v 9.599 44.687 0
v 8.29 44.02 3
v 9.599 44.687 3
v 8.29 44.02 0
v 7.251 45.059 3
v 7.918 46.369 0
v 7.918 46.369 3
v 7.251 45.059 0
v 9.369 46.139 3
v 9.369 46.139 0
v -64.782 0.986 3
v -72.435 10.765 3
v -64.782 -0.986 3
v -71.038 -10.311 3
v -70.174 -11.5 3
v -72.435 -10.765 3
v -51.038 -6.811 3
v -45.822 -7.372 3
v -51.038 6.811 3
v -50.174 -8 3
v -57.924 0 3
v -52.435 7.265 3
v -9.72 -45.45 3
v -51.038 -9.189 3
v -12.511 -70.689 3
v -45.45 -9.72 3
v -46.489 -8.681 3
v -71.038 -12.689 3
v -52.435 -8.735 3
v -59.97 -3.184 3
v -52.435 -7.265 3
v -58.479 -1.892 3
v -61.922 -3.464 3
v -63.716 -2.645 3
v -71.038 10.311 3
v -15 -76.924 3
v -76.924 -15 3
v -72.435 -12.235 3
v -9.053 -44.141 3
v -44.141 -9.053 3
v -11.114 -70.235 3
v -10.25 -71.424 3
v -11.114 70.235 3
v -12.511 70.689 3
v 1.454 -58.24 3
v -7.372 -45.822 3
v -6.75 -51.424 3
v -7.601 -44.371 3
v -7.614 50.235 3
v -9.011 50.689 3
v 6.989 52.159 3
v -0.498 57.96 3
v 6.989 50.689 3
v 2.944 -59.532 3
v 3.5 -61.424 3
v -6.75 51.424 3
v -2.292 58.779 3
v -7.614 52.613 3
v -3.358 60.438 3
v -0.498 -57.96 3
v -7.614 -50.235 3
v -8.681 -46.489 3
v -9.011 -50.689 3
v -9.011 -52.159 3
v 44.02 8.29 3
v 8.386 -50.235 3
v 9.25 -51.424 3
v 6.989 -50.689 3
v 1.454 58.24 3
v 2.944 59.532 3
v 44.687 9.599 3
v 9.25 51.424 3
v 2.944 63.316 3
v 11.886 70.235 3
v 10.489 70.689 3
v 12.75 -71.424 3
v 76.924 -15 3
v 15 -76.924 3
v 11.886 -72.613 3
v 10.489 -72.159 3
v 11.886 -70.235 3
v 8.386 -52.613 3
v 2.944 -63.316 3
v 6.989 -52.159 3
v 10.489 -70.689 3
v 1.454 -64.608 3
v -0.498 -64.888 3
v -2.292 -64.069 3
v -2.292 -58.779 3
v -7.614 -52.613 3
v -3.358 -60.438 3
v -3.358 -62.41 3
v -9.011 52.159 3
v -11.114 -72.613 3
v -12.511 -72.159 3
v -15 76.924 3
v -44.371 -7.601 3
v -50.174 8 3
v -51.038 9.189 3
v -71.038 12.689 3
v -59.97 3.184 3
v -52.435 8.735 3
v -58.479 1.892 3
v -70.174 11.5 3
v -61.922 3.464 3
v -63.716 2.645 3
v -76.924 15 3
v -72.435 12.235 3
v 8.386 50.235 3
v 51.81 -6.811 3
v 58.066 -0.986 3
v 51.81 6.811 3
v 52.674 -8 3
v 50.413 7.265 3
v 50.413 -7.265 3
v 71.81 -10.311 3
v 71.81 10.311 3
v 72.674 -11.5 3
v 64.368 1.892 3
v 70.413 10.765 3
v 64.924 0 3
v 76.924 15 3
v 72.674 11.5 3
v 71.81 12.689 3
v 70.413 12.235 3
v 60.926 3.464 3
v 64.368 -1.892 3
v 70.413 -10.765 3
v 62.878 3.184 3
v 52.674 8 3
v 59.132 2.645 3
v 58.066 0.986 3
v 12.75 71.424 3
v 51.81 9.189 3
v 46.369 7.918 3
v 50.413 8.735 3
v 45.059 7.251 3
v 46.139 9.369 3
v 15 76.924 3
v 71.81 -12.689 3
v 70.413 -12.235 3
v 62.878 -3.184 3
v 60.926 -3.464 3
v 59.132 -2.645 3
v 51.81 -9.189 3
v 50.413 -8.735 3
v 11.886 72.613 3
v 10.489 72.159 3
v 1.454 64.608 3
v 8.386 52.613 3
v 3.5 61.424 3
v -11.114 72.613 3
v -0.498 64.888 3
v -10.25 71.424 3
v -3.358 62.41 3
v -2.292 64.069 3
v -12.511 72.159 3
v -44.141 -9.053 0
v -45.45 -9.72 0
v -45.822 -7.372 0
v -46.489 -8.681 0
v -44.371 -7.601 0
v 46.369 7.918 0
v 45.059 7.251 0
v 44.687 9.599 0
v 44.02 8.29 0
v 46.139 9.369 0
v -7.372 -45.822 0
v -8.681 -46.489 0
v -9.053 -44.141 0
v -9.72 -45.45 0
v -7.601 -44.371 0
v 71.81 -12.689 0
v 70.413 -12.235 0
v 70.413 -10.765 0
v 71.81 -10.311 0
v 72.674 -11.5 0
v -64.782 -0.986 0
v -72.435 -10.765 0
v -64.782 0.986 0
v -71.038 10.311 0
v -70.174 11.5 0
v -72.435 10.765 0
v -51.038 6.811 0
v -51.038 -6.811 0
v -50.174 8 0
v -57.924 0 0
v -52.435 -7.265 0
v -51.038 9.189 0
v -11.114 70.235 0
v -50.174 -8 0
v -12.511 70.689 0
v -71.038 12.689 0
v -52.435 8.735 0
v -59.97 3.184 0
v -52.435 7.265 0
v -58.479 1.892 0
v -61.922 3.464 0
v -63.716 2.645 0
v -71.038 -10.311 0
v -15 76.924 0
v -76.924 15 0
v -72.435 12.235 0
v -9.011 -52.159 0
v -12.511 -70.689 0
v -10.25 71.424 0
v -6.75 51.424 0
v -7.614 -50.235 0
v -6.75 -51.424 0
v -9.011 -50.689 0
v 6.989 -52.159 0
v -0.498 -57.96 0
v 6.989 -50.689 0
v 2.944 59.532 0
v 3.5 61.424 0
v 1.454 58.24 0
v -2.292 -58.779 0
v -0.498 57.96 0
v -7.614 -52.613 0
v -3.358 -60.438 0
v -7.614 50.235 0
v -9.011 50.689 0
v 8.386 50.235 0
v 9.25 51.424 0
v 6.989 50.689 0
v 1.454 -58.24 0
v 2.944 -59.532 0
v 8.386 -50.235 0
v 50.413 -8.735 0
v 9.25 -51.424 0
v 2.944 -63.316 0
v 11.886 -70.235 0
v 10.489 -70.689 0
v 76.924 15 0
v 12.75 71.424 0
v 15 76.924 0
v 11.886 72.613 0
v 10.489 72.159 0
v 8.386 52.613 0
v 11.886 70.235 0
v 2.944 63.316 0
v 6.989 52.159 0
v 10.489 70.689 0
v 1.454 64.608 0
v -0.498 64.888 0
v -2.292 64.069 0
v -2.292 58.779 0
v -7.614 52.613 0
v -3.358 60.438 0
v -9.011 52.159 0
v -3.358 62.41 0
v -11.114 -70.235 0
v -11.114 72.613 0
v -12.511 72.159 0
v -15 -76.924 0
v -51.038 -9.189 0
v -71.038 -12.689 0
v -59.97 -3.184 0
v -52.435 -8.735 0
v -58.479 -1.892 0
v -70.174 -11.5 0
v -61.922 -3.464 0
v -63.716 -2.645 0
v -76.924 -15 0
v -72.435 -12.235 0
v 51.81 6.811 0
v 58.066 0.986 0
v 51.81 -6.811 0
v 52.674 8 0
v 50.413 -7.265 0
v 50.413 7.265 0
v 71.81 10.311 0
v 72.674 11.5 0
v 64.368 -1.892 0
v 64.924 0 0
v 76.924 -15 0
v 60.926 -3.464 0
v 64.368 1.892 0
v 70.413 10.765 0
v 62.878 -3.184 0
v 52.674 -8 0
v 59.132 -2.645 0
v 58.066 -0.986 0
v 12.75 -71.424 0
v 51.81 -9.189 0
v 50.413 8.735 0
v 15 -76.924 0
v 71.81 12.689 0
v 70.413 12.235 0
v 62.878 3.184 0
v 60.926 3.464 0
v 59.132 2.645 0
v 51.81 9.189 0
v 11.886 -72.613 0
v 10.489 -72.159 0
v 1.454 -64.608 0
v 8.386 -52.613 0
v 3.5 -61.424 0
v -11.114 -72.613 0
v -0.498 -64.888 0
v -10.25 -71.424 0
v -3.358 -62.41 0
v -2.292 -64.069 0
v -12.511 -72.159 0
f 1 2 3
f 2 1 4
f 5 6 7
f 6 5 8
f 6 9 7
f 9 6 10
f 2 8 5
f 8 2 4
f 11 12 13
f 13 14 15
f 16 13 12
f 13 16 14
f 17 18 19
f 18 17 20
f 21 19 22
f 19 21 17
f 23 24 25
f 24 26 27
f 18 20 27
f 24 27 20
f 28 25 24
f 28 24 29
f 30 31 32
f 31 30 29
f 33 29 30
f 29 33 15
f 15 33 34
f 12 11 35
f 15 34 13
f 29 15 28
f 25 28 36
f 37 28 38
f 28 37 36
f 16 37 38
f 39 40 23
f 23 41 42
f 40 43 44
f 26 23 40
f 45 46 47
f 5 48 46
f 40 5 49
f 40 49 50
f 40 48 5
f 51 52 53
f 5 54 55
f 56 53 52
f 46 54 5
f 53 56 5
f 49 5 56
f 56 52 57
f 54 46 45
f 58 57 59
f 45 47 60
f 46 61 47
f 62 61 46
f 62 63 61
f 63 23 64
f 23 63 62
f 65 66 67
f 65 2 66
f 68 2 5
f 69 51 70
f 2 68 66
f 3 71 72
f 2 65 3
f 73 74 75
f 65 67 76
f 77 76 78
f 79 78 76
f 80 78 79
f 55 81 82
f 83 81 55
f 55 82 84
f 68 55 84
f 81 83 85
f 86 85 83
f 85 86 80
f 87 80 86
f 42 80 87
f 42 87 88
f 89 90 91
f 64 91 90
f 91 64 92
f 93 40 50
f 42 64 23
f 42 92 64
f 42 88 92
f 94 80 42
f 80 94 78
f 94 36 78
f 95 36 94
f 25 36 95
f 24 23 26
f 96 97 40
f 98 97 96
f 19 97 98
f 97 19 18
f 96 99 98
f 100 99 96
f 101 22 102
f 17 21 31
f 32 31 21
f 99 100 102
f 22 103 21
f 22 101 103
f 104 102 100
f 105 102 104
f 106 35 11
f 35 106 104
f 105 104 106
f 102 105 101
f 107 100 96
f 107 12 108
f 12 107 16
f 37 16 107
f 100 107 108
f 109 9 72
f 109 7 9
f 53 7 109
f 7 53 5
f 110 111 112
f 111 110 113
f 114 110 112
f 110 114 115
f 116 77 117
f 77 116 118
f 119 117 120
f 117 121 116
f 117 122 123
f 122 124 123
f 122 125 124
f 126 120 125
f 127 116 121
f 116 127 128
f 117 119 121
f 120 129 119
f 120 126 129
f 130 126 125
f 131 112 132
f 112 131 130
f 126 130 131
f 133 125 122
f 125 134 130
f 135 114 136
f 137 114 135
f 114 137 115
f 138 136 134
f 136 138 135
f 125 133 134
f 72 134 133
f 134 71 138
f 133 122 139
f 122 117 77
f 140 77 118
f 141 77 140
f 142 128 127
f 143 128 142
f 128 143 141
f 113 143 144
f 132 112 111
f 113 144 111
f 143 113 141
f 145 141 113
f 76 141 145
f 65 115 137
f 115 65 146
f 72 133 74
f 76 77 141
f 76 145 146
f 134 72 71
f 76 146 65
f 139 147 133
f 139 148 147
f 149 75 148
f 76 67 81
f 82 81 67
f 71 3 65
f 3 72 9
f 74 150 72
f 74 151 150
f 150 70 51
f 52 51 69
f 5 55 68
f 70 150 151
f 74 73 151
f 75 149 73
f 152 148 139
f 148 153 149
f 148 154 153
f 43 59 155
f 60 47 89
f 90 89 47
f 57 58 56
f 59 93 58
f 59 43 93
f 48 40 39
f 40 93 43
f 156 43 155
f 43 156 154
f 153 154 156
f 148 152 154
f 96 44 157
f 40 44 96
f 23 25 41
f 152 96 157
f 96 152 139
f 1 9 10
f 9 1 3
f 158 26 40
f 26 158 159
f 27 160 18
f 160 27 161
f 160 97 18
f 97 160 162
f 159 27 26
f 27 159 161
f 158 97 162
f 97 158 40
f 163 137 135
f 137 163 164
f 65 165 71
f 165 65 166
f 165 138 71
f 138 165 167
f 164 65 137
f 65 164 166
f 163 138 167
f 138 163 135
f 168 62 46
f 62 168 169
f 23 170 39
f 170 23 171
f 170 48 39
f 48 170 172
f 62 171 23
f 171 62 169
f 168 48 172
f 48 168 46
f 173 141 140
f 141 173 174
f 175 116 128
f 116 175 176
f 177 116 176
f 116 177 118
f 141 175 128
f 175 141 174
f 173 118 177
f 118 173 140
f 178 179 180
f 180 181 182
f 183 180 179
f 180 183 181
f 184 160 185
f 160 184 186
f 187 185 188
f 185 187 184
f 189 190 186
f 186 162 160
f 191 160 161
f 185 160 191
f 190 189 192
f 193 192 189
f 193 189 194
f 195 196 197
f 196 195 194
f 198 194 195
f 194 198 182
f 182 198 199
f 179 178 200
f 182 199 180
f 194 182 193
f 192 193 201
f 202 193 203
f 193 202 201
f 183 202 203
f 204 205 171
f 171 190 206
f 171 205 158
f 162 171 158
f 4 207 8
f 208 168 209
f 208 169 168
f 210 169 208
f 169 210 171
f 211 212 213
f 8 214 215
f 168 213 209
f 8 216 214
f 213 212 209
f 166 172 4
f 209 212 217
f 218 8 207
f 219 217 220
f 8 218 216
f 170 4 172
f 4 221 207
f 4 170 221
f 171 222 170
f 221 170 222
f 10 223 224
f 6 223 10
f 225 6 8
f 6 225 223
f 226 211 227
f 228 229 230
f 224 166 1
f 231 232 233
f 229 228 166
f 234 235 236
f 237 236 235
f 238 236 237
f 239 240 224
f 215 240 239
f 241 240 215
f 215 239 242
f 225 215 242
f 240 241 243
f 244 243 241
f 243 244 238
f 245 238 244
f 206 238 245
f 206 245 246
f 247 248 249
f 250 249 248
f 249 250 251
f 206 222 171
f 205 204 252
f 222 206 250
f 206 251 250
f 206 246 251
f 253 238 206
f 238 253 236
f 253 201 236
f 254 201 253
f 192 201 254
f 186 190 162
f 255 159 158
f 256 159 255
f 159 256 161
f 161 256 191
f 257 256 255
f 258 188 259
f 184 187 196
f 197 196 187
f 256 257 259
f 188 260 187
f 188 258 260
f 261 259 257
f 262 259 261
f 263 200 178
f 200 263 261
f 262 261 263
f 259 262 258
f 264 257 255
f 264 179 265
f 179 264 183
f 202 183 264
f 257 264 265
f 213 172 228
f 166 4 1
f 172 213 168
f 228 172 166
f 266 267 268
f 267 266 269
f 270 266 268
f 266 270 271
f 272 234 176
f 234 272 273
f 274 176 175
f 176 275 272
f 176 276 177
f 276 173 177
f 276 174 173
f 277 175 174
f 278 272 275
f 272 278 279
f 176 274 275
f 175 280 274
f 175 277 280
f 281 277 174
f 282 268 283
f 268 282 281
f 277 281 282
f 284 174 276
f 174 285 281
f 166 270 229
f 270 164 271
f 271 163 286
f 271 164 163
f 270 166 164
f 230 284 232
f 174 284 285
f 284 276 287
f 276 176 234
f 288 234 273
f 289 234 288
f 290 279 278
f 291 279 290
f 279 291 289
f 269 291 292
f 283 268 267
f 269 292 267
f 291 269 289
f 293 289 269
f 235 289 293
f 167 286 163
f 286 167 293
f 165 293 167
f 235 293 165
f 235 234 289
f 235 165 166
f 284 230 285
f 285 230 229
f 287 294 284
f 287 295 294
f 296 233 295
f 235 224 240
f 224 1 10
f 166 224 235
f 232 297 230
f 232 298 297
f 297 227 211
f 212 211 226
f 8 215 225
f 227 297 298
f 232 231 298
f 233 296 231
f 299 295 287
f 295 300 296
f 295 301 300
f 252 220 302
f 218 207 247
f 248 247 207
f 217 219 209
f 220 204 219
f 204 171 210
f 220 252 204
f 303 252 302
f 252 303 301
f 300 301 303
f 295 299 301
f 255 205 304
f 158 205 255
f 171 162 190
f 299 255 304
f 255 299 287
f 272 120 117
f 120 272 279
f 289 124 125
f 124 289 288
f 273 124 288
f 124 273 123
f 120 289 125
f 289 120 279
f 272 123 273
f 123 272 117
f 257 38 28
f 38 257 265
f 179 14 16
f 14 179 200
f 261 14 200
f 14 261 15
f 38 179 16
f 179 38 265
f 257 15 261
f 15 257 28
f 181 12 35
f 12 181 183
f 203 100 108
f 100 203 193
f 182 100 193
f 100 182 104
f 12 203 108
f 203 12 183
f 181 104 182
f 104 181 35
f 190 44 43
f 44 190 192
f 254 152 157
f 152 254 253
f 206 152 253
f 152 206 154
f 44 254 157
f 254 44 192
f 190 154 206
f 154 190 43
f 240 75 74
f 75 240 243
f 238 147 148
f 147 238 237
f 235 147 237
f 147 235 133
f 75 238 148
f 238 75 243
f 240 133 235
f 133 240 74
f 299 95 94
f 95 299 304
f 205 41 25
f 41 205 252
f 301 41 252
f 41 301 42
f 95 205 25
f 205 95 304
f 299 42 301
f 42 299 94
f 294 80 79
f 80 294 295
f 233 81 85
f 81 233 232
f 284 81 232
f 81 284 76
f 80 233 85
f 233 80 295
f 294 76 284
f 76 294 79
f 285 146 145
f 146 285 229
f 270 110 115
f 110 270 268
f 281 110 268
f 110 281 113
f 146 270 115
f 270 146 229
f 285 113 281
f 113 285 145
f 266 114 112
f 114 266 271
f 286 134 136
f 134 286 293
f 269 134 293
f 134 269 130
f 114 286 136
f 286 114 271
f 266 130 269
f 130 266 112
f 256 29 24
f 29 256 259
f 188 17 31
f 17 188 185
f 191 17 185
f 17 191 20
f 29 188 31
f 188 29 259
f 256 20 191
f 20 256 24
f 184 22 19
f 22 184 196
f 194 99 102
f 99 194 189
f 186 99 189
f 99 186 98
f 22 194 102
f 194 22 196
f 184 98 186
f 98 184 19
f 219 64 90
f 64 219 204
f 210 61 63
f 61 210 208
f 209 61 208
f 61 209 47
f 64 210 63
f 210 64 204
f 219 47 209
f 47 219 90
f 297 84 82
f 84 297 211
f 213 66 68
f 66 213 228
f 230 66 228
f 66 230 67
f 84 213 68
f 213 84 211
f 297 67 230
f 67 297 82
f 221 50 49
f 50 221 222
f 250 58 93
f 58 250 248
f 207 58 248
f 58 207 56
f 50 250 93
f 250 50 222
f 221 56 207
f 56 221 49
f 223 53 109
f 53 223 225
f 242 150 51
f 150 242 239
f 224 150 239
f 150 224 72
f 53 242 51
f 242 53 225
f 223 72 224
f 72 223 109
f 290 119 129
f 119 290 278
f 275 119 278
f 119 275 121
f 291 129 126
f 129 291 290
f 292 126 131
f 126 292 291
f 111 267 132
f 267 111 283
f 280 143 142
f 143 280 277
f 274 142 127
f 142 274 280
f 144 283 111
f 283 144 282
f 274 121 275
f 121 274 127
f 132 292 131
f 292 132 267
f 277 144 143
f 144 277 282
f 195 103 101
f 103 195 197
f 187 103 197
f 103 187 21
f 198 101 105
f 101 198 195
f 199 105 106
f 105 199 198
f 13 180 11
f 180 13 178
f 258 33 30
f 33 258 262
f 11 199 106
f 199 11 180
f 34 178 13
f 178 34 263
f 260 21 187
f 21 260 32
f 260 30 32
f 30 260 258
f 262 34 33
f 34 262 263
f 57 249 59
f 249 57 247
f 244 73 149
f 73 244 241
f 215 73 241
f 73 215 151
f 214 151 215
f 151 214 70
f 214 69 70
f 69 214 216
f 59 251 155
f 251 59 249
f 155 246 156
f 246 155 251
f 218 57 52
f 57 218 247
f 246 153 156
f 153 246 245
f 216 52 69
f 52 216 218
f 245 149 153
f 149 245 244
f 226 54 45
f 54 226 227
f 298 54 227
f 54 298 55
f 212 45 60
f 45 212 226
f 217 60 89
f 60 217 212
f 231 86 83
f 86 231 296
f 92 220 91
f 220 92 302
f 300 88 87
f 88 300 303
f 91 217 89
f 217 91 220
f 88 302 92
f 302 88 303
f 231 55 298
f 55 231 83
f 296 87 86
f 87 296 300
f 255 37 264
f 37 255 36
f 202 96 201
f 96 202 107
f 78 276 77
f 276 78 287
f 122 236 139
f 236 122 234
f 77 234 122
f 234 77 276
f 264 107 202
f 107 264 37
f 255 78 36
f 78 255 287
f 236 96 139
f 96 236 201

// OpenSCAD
// file: common.scad
module M25Hole(x, y, z, depth) {
    translate([x, y, z]) {
        cylinder(h = depth, d = 2.5, center = true);
    }
}

module M6Hole(x, y, z, depth) {
    translate([x, y, z]) {
        cylinder(h = depth, d = 7.0, center = true);
    }
}

module OdroidXU4MountHoles(plate_depth) {
    depth = 76;
    width = 52;

    rotate(45) {
        M25Hole(depth / 2.0, width / 2.0, 0.0, plate_depth * 2);
        M25Hole(-depth / 2.0, width / 2.0, 0.0, plate_depth * 2);
        M25Hole(depth / 2.0, -width / 2.0, 0.0, plate_depth * 2);
        M25Hole(-depth / 2.0, -width / 2.0, 0.0, plate_depth * 2);
    }
}

module StackHoles(plate_width, plate_depth, plate_diagonal) {
    between_line = 20.0;

    E = 5.5;
    F = (plate_diagonal / 2.0) - E;
    H = F - (between_line / 2.0);

    M6Hole(H, 0.0, plate_depth / 2.0, plate_depth);
    M6Hole(-H, 0.0, plate_depth / 2.0, plate_depth);
    M6Hole(0.0, H, plate_depth / 2.0, plate_depth);
    M6Hole(0.0, -H, plate_depth / 2.0, plate_depth);
}
// main file
use <common.scad>

// plate parameters
plate_width = 130.0;
plate_depth = 3.0;


module ArmScrewHoles(plate_width, plate_depth, plate_diagonal) {
    base_line = 23.0;
    top_line = 16.0;
    between_line = 20.0;

    E = 5.5;
    F = (plate_diagonal / 2.0) - E;
    G = F - between_line;

    // outer screw holes
    M25Hole(F, -base_line / 2.0, plate_depth / 2.0, plate_depth);
    M25Hole(F, base_line / 2.0, plate_depth / 2.0, plate_depth);

    M25Hole(-F, -base_line / 2.0, plate_depth / 2.0, plate_depth);
    M25Hole(-F, base_line / 2.0, plate_depth / 2.0, plate_depth);

    M25Hole(-base_line / 2.0, F, plate_depth / 2.0, plate_depth);
    M25Hole(base_line / 2.0, F, plate_depth / 2.0, plate_depth);

    M25Hole(-base_line / 2.0, -F, plate_depth / 2.0, plate_depth);
    M25Hole(base_line / 2.0, -F, plate_depth / 2.0, plate_depth);

    // inner screw holes
    M25Hole(G, -top_line / 2, plate_depth / 2.0, plate_depth);
    M25Hole(G, top_line / 2, plate_depth / 2.0, plate_depth);

    M25Hole(-G, -top_line / 2, plate_depth / 2.0, plate_depth);
    M25Hole(-G, top_line / 2, plate_depth / 2.0, plate_depth);

    M25Hole(-top_line / 2, -G, plate_depth / 2.0, plate_depth);
    M25Hole(top_line / 2, -G, plate_depth / 2.0, plate_depth);

    M25Hole(-top_line / 2, G, plate_depth / 2.0, plate_depth);
    M25Hole(top_line / 2, G, plate_depth / 2.0, plate_depth);
}

module TopPlate(plate_width, plate_depth) {
    difference() {
        // plate
        rotate(45) {
            translate([-plate_width / 2.0, -plate_width / 2.0, 0.0]) {
                cube([plate_width, plate_width, plate_depth]);
            }
        }

        // square cut plate corners
        A = plate_width;
        B = sqrt(2 * pow(A, 2));
        C = 30.0;
        D = 30.0;

        translate([B / 2.0, 0.0, plate_depth / 2.0]) { cube([C, D, plate_depth], true); }
        translate([-B / 2.0, 0.0, plate_depth / 2.0]) { cube([C, D, plate_depth], true); }
        translate([0.0, -B / 2.0, plate_depth / 2.0]) { cube([D, C, plate_depth], true); }
        translate([0.0, B/ 2.0, plate_depth / 2.0]) { cube([D, C, plate_depth], true); }

        // holes
        OdroidXU4MountHoles(plate_depth);
        ArmScrewHoles(plate_width, plate_depth, B - C);
        StackHoles(plate_width, plate_depth, B - C);
    }
}

TopPlate(plate_width, plate_depth);
